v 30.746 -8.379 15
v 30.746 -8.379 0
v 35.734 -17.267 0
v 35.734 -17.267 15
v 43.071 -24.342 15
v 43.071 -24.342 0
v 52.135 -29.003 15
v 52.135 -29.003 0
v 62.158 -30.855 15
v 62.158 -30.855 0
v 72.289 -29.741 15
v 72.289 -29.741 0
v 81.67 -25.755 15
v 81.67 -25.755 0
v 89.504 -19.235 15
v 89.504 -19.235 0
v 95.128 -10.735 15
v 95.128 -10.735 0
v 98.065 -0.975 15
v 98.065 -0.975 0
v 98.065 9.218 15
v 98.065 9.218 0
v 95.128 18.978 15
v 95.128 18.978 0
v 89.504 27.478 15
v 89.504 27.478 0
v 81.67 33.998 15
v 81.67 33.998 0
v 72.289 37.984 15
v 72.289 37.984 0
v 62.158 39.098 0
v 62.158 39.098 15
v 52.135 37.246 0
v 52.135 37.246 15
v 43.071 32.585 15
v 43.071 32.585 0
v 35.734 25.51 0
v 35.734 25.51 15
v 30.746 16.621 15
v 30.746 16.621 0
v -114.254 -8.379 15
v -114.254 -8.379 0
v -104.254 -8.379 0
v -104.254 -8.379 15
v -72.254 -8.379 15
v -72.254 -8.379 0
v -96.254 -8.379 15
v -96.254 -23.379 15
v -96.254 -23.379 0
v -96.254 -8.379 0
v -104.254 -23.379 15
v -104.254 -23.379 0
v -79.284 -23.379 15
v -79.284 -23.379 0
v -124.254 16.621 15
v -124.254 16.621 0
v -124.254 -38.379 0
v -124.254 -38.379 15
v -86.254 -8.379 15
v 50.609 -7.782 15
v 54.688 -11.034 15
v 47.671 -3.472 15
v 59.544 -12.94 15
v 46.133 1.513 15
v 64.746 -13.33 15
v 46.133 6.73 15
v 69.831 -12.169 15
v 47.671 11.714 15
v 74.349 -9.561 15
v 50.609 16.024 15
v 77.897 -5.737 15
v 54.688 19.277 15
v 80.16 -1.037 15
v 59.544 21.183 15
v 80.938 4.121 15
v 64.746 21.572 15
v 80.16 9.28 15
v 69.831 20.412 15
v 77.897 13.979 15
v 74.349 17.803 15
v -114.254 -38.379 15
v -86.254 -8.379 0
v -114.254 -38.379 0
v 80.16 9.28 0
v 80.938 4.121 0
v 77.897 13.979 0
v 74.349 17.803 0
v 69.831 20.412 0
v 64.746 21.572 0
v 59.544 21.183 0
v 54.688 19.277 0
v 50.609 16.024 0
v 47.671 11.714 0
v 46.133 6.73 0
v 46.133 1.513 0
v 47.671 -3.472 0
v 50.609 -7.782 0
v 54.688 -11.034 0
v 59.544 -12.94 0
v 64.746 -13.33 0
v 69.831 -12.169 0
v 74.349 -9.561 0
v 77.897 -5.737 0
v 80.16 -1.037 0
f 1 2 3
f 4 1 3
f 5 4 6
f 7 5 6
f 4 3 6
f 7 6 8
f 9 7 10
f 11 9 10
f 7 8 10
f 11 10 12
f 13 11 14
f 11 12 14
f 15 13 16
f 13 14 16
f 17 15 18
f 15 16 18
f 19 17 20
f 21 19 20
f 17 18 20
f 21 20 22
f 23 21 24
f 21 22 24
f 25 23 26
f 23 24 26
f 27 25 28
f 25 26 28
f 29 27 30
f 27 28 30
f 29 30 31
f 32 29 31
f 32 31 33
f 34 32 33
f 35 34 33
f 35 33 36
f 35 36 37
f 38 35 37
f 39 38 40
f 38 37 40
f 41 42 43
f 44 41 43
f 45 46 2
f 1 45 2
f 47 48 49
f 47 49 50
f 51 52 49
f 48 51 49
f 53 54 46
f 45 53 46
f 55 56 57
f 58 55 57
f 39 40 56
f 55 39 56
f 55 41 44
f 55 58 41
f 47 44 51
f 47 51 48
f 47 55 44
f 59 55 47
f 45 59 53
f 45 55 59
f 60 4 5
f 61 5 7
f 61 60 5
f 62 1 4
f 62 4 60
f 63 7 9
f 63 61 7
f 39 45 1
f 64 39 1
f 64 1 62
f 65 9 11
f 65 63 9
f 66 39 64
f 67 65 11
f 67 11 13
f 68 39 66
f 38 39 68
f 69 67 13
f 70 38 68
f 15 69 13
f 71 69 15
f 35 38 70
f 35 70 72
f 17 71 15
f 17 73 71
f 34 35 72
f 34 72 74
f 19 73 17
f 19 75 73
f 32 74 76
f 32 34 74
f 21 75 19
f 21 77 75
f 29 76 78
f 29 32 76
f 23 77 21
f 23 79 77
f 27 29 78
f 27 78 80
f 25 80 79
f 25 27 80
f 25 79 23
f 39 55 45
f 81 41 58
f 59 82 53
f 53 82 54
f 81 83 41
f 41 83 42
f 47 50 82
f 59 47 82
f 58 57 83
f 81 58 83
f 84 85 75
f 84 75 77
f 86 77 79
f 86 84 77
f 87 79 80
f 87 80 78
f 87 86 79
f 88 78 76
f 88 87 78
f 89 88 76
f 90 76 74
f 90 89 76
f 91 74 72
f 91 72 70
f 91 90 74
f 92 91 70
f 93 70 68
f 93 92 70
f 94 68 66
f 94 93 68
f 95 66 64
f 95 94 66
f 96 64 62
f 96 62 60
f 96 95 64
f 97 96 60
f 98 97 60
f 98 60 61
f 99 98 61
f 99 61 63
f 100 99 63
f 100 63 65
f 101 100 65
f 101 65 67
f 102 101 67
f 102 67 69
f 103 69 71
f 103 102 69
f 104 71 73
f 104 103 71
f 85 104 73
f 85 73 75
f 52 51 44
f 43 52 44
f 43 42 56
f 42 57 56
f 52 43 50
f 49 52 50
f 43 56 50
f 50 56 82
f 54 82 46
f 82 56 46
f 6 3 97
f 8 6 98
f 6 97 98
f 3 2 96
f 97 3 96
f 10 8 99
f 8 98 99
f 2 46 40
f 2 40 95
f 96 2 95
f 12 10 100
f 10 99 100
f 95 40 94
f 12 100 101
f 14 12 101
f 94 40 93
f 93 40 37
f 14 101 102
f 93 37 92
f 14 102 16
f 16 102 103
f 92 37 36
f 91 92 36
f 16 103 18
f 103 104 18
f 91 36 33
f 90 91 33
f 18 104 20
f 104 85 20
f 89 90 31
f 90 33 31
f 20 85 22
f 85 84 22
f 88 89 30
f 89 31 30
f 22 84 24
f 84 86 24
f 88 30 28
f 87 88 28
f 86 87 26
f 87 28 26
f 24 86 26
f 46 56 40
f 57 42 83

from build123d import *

# Parameters (mm, degrees)
F0_R     = 17.5
F0_W     = 10
F0_H     = 30
F0_W_2   = 8
F0_H_2   = 15
F1_DEPTH = 15


with BuildPart() as f1:
    # F0 (on Top) → F1 (new body)
    with BuildSketch(Plane.XY):
        with BuildLine():
            Line((30.746029, 16.621397), (-124.253971, 16.621397))
            Line((-124.253971, 16.621397), (-124.253971, -8.378603))
            Line((-124.253971, -8.378603), (-114.253971, -8.378603))
            Line((-114.253971, -8.378603), (-104.253971, -8.378603))
            Line((-104.253971, -8.378603), (-96.253971, -8.378603))
            Line((-96.253971, -8.378603), (-86.253971, -8.378603))
            Line((-86.253971, -8.378603), (-72.253971, -8.378603))
            Line((-72.253971, -8.378603), (30.746029, -8.378603))
            ThreePointArc((30.746029, -8.378603), (98.437771, 4.121397), (30.746029, 16.621397))
        make_face()
        with Locations((63.437771, 4.121397)):
            Circle(F0_R, mode=Mode.SUBTRACT)
        with Locations((-119.253971, -23.378603)):
            Rectangle(F0_W, F0_H)
        with Locations((-100.253971, -15.878603)):
            Rectangle(F0_W_2, F0_H_2)
        Polygon((-79.28396, -23.378603), (-72.253971, -8.378603), (-86.253971, -8.378603), align=None)
    extrude(amount=F1_DEPTH)


solid = f1.part
